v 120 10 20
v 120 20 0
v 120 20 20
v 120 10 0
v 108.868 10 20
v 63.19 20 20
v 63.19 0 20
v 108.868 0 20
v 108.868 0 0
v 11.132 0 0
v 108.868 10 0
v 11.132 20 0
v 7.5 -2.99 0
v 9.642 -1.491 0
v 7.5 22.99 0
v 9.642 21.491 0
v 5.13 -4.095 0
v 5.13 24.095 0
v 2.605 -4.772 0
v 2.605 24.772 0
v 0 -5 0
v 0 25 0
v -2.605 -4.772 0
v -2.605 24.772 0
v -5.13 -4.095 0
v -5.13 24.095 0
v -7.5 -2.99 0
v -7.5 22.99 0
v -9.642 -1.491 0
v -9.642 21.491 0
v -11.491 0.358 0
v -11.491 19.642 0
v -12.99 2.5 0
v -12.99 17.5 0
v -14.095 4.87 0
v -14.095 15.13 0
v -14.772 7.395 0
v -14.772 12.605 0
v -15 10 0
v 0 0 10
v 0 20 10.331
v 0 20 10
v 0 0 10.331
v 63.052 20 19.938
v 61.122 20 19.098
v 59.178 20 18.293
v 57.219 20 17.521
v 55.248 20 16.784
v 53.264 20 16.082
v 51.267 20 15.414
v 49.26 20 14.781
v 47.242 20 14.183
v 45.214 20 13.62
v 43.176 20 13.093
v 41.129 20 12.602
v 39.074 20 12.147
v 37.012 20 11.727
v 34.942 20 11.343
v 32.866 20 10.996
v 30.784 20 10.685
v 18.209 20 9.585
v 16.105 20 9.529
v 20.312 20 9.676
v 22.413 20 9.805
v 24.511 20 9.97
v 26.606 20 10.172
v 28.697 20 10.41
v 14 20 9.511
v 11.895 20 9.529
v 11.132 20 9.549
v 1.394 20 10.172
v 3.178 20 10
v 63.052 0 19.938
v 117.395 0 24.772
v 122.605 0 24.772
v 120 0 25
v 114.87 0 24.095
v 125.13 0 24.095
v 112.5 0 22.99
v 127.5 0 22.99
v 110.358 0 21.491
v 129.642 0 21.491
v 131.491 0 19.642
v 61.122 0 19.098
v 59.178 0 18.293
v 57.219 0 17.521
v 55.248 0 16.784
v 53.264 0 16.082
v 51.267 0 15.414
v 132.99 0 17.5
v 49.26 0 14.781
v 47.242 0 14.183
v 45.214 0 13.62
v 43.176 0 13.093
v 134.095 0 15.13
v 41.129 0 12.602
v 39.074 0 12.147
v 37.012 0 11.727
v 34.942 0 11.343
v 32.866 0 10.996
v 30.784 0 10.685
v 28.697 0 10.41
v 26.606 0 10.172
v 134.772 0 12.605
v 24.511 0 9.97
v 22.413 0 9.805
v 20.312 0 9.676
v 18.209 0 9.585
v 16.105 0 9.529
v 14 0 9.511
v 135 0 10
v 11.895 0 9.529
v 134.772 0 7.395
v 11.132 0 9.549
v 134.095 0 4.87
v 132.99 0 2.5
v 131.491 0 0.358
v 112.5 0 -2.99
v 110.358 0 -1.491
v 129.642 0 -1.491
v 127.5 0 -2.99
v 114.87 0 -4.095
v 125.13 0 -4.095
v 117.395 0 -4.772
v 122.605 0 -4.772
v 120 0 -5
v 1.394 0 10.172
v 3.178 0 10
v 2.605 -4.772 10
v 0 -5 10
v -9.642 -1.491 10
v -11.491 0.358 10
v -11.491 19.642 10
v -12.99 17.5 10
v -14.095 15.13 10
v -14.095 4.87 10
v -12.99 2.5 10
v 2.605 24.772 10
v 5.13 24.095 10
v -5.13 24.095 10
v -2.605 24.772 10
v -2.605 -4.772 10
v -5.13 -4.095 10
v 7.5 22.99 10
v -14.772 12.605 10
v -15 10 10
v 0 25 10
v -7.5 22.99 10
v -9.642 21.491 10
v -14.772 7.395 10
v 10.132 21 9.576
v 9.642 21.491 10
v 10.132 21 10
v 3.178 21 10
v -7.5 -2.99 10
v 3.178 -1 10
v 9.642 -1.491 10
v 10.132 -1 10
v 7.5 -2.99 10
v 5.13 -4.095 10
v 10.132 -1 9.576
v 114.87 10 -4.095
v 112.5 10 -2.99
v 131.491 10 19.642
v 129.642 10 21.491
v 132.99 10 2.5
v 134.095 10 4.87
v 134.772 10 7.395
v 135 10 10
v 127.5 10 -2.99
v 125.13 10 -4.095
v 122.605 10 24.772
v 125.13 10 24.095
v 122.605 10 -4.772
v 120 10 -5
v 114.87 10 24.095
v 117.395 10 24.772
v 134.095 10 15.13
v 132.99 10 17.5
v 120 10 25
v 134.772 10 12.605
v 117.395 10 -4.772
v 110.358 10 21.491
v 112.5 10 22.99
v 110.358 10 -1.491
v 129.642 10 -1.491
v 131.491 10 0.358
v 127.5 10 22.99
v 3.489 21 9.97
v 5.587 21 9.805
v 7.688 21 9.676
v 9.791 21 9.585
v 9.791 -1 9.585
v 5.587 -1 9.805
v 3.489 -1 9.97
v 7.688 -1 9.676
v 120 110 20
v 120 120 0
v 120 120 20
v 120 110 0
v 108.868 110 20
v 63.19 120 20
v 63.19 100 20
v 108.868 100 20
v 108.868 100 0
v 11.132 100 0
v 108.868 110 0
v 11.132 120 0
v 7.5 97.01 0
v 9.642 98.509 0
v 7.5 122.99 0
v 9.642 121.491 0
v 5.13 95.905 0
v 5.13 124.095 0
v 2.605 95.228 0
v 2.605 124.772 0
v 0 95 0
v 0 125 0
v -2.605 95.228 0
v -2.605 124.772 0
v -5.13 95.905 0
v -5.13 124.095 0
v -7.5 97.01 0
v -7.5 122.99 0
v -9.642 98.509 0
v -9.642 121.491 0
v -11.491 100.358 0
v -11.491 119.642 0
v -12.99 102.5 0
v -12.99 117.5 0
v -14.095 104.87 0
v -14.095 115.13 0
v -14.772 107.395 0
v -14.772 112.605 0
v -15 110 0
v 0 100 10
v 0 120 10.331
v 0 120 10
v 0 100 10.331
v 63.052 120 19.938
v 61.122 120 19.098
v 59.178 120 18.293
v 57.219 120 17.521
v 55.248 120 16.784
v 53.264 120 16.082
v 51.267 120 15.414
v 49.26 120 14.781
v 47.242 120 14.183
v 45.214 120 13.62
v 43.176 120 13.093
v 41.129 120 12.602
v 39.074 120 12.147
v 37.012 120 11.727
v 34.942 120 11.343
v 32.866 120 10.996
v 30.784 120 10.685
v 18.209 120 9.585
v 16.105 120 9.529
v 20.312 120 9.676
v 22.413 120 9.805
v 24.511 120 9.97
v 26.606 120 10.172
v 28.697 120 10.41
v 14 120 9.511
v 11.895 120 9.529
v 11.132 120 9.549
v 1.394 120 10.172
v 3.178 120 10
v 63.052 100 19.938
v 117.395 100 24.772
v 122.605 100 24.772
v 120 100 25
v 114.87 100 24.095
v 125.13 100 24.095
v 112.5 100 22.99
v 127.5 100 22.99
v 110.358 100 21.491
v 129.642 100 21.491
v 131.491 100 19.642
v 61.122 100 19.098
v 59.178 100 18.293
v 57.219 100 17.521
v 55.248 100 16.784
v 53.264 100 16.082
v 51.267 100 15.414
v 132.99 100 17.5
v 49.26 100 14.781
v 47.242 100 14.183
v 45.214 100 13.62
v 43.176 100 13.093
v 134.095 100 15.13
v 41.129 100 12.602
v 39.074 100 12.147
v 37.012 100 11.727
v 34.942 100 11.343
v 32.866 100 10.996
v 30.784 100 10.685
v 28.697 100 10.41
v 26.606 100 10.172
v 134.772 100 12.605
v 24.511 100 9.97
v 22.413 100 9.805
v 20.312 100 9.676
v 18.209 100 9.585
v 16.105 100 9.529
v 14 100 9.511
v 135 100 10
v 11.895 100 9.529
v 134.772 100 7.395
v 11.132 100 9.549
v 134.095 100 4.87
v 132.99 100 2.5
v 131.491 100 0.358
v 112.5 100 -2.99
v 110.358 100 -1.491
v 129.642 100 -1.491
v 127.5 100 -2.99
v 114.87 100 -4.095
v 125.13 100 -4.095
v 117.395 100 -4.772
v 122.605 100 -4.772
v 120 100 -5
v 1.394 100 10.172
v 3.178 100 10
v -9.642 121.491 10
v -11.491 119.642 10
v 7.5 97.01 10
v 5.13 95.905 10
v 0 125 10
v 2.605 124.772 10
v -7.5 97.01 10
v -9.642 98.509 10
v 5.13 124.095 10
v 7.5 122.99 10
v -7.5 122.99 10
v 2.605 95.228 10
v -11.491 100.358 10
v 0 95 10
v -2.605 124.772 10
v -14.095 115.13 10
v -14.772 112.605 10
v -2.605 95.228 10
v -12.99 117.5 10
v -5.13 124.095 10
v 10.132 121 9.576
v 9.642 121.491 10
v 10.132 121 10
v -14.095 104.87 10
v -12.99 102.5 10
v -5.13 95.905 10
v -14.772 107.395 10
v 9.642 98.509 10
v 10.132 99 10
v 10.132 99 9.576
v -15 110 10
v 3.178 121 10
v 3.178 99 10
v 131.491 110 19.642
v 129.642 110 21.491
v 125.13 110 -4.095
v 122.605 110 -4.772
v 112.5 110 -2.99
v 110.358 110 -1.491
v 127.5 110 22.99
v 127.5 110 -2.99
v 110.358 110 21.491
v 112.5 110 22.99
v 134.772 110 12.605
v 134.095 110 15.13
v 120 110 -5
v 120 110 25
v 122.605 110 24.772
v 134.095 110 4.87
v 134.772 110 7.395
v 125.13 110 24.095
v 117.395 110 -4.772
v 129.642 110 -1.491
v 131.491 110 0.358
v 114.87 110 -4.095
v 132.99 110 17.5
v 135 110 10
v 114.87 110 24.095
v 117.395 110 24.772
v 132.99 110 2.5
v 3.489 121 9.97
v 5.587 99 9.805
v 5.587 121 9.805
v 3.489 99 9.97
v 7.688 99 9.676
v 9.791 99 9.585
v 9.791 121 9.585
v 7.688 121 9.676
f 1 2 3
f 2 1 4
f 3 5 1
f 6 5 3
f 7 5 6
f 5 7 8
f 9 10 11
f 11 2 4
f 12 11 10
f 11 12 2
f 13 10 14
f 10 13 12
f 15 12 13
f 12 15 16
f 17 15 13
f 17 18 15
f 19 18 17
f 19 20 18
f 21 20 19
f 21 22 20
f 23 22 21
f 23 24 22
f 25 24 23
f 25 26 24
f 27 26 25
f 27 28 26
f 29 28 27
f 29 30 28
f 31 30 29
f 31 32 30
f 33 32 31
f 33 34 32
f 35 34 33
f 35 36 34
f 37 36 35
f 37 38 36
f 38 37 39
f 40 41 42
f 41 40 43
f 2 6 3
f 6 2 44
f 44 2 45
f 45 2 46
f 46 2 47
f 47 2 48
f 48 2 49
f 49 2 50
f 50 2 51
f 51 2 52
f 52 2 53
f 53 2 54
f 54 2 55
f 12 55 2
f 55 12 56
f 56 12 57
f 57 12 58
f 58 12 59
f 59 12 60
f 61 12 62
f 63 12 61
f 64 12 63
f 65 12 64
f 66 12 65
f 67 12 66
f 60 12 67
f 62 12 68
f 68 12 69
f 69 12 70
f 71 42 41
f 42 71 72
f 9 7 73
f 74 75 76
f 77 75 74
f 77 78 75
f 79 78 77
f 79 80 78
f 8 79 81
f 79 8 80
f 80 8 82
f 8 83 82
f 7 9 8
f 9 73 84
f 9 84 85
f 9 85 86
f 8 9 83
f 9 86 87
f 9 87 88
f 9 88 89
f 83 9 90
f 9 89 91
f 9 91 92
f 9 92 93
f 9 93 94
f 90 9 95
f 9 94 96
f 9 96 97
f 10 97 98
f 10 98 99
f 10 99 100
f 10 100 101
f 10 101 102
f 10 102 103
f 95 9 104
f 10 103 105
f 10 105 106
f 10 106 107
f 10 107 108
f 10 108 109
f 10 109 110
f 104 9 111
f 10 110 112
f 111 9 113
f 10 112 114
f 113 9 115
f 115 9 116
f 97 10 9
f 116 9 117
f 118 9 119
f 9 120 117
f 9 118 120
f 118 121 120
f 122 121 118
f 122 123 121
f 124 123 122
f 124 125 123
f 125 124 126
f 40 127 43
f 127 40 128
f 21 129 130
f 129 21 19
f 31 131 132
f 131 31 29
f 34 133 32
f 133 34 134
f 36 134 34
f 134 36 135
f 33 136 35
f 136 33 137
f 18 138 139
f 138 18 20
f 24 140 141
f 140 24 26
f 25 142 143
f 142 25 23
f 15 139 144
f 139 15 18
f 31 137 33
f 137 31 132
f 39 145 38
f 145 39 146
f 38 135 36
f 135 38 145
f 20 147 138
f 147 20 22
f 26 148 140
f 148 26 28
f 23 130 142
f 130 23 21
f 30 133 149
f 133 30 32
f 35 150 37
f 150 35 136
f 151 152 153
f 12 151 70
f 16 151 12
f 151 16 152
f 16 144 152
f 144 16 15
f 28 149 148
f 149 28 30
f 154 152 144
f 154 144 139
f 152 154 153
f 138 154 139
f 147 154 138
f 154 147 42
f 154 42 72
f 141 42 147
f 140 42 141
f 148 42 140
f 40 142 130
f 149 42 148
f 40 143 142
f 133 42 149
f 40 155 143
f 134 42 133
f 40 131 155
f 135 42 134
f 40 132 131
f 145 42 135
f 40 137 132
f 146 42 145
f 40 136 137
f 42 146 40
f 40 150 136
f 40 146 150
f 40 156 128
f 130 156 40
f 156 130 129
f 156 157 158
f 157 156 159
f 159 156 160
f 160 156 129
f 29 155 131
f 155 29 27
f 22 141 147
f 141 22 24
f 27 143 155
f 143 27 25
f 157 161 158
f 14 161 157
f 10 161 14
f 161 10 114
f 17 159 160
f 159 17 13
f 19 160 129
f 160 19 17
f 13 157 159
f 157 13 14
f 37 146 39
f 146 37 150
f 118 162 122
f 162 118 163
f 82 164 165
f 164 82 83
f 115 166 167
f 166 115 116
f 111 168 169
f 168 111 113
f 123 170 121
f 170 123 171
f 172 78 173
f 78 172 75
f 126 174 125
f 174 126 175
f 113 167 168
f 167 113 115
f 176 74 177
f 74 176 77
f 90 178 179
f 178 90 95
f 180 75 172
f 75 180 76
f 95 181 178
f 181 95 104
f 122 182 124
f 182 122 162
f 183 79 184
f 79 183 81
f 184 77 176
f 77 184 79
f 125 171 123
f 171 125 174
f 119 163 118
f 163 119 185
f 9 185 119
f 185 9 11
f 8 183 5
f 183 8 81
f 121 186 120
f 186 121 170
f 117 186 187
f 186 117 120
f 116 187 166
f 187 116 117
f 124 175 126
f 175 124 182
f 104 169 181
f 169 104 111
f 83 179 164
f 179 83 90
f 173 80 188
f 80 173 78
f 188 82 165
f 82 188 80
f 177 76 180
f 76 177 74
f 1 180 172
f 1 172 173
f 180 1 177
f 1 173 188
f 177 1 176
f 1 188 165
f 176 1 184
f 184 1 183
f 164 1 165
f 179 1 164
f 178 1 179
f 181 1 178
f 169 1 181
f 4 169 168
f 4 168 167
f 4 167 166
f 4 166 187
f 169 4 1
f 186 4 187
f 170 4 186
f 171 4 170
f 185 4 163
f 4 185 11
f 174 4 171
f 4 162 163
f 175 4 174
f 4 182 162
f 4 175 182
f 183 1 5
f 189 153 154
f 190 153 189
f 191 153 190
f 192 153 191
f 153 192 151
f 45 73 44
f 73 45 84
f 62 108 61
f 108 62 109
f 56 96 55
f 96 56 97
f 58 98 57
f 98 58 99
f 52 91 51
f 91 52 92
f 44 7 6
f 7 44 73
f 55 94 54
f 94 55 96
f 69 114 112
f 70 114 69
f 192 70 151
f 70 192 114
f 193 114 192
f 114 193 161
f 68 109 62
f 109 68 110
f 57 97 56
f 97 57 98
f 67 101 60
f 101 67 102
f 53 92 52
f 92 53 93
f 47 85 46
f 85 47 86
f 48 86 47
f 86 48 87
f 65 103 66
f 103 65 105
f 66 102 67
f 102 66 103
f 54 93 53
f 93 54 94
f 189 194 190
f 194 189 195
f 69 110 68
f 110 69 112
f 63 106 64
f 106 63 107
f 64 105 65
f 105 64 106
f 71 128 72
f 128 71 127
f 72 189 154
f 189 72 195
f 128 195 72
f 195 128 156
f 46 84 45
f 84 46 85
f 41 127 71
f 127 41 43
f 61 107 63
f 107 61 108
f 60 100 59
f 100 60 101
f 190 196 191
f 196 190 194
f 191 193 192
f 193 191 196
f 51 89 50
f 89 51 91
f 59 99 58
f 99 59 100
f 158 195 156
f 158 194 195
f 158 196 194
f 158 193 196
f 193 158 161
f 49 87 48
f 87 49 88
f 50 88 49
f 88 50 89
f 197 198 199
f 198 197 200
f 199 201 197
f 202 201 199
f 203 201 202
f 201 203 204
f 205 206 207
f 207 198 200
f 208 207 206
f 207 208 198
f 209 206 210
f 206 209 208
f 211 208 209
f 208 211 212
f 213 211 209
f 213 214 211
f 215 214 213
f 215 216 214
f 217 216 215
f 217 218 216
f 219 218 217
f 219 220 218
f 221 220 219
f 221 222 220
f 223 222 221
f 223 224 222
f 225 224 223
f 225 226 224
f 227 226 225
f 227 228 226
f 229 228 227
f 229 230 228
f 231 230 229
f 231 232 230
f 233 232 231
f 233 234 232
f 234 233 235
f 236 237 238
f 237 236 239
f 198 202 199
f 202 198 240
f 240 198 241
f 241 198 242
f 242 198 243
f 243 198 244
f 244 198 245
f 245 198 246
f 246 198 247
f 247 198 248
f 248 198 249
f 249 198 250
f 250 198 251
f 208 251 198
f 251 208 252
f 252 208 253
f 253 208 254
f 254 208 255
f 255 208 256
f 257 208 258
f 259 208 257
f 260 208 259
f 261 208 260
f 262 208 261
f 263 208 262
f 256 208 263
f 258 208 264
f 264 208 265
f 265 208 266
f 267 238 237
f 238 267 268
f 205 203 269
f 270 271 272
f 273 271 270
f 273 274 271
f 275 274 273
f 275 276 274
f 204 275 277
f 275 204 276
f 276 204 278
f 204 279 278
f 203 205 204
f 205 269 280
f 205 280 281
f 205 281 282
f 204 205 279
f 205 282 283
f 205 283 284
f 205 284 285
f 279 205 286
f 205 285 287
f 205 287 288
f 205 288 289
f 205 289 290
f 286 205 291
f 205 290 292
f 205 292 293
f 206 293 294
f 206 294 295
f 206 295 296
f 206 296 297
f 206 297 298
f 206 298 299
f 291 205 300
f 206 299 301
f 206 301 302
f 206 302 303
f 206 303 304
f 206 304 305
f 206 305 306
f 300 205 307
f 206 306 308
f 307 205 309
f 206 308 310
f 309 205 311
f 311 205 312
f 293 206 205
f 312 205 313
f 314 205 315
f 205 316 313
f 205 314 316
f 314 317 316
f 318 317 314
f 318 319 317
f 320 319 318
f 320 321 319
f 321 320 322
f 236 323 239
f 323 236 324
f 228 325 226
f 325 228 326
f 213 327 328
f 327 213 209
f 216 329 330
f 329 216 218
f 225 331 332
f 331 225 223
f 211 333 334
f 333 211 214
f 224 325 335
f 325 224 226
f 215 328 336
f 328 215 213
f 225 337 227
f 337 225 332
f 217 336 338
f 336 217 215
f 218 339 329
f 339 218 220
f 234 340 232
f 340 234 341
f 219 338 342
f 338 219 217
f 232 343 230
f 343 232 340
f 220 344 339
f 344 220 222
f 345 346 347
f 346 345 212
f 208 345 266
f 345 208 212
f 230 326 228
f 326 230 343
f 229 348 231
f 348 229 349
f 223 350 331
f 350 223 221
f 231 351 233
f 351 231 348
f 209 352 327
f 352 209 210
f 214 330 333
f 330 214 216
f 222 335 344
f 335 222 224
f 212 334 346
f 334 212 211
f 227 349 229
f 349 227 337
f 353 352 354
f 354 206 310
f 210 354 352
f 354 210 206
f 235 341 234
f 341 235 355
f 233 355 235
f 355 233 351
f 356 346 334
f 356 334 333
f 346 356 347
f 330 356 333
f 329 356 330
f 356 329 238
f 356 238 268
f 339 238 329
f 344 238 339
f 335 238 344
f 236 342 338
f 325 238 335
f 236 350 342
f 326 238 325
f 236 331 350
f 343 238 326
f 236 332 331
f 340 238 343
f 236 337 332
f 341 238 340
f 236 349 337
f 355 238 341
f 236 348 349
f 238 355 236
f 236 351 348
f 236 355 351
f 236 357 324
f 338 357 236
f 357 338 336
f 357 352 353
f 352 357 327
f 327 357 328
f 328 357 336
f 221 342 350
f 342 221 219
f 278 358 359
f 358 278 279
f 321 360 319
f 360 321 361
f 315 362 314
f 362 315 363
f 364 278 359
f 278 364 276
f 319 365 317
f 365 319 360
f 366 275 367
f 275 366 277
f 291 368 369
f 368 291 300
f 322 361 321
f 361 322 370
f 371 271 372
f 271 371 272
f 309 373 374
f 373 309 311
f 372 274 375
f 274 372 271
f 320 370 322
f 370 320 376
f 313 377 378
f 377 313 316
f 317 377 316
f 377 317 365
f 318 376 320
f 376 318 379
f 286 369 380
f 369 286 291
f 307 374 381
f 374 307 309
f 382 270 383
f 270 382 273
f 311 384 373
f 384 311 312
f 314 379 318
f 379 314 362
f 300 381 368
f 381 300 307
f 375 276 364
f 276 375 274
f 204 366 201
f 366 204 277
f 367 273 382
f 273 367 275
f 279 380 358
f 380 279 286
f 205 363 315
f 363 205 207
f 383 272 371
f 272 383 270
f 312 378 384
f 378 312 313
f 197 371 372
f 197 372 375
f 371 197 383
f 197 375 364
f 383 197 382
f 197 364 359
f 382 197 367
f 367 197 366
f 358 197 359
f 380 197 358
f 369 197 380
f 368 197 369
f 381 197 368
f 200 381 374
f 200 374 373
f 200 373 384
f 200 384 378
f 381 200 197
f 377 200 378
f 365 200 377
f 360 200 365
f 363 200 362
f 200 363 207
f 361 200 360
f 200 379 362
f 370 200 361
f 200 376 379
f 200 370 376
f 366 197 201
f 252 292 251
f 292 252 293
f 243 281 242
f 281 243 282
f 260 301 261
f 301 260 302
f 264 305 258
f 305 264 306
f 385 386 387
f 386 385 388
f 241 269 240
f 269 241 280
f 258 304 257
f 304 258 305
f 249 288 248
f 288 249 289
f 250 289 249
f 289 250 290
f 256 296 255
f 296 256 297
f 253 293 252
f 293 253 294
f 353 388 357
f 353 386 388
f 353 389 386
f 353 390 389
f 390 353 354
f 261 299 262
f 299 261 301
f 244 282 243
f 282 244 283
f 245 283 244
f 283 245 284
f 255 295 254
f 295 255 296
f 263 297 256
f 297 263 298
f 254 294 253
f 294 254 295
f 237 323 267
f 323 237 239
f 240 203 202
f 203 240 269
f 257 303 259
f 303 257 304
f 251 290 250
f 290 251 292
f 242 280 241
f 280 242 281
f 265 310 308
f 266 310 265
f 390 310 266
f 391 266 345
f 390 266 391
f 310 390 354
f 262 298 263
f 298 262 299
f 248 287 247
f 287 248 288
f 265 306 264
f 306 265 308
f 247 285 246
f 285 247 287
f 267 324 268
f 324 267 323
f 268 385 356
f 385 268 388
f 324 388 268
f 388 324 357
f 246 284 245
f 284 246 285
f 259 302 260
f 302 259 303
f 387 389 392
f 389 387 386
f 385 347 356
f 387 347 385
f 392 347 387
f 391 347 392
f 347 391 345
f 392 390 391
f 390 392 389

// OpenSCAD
femur = 120;
knee = 120;
width = 20;
pitch = 100;

hwidth = width/2;
hpitch = pitch/2;


module topLimb(x,y,z,a) {
    difference() {
        union(){
            translate([x,y,z]) rotate([0,a,0]) cube([femur, width, width]);
            translate([x,y+hwidth,z]) rotate([0,a,0]) cylinder(d=width*1.5, h=10, $fn=36);
            
            translate([x+femur,y+hwidth,z+hwidth]) rotate([90,90,0]) cylinder(d=width*1.5, h=10, $fn=36);
        }
        union(){
//            translate([x+(femur/3)-1,y-1,z-(pitch/1.8)-1]) rotate([0,90,90]) cylinder(d=femur, h=width+2, $fn=360);
//            translate([x+(femur/3)-1,y-1,z+width+(pitch/1.8)-1]) rotate([0,90,90]) cylinder(d=femur, h=width+2, $fn=360);   
             translate([x+(femur/8)-1,y+width+1,z+width+(pitch/0.9)-1]) rotate([90,0,0]) cylinder(d=femur*2.01, h=width+2, $fn=360); 
        }
    }
}

module lowerLimb(x,y,z,a) {
}

module leftLeg() {
    topLimb(0,0,0,0);
}

module rightLeg() {
    topLimb(0,pitch,0,0);
}

leftLeg();
rightLeg();
